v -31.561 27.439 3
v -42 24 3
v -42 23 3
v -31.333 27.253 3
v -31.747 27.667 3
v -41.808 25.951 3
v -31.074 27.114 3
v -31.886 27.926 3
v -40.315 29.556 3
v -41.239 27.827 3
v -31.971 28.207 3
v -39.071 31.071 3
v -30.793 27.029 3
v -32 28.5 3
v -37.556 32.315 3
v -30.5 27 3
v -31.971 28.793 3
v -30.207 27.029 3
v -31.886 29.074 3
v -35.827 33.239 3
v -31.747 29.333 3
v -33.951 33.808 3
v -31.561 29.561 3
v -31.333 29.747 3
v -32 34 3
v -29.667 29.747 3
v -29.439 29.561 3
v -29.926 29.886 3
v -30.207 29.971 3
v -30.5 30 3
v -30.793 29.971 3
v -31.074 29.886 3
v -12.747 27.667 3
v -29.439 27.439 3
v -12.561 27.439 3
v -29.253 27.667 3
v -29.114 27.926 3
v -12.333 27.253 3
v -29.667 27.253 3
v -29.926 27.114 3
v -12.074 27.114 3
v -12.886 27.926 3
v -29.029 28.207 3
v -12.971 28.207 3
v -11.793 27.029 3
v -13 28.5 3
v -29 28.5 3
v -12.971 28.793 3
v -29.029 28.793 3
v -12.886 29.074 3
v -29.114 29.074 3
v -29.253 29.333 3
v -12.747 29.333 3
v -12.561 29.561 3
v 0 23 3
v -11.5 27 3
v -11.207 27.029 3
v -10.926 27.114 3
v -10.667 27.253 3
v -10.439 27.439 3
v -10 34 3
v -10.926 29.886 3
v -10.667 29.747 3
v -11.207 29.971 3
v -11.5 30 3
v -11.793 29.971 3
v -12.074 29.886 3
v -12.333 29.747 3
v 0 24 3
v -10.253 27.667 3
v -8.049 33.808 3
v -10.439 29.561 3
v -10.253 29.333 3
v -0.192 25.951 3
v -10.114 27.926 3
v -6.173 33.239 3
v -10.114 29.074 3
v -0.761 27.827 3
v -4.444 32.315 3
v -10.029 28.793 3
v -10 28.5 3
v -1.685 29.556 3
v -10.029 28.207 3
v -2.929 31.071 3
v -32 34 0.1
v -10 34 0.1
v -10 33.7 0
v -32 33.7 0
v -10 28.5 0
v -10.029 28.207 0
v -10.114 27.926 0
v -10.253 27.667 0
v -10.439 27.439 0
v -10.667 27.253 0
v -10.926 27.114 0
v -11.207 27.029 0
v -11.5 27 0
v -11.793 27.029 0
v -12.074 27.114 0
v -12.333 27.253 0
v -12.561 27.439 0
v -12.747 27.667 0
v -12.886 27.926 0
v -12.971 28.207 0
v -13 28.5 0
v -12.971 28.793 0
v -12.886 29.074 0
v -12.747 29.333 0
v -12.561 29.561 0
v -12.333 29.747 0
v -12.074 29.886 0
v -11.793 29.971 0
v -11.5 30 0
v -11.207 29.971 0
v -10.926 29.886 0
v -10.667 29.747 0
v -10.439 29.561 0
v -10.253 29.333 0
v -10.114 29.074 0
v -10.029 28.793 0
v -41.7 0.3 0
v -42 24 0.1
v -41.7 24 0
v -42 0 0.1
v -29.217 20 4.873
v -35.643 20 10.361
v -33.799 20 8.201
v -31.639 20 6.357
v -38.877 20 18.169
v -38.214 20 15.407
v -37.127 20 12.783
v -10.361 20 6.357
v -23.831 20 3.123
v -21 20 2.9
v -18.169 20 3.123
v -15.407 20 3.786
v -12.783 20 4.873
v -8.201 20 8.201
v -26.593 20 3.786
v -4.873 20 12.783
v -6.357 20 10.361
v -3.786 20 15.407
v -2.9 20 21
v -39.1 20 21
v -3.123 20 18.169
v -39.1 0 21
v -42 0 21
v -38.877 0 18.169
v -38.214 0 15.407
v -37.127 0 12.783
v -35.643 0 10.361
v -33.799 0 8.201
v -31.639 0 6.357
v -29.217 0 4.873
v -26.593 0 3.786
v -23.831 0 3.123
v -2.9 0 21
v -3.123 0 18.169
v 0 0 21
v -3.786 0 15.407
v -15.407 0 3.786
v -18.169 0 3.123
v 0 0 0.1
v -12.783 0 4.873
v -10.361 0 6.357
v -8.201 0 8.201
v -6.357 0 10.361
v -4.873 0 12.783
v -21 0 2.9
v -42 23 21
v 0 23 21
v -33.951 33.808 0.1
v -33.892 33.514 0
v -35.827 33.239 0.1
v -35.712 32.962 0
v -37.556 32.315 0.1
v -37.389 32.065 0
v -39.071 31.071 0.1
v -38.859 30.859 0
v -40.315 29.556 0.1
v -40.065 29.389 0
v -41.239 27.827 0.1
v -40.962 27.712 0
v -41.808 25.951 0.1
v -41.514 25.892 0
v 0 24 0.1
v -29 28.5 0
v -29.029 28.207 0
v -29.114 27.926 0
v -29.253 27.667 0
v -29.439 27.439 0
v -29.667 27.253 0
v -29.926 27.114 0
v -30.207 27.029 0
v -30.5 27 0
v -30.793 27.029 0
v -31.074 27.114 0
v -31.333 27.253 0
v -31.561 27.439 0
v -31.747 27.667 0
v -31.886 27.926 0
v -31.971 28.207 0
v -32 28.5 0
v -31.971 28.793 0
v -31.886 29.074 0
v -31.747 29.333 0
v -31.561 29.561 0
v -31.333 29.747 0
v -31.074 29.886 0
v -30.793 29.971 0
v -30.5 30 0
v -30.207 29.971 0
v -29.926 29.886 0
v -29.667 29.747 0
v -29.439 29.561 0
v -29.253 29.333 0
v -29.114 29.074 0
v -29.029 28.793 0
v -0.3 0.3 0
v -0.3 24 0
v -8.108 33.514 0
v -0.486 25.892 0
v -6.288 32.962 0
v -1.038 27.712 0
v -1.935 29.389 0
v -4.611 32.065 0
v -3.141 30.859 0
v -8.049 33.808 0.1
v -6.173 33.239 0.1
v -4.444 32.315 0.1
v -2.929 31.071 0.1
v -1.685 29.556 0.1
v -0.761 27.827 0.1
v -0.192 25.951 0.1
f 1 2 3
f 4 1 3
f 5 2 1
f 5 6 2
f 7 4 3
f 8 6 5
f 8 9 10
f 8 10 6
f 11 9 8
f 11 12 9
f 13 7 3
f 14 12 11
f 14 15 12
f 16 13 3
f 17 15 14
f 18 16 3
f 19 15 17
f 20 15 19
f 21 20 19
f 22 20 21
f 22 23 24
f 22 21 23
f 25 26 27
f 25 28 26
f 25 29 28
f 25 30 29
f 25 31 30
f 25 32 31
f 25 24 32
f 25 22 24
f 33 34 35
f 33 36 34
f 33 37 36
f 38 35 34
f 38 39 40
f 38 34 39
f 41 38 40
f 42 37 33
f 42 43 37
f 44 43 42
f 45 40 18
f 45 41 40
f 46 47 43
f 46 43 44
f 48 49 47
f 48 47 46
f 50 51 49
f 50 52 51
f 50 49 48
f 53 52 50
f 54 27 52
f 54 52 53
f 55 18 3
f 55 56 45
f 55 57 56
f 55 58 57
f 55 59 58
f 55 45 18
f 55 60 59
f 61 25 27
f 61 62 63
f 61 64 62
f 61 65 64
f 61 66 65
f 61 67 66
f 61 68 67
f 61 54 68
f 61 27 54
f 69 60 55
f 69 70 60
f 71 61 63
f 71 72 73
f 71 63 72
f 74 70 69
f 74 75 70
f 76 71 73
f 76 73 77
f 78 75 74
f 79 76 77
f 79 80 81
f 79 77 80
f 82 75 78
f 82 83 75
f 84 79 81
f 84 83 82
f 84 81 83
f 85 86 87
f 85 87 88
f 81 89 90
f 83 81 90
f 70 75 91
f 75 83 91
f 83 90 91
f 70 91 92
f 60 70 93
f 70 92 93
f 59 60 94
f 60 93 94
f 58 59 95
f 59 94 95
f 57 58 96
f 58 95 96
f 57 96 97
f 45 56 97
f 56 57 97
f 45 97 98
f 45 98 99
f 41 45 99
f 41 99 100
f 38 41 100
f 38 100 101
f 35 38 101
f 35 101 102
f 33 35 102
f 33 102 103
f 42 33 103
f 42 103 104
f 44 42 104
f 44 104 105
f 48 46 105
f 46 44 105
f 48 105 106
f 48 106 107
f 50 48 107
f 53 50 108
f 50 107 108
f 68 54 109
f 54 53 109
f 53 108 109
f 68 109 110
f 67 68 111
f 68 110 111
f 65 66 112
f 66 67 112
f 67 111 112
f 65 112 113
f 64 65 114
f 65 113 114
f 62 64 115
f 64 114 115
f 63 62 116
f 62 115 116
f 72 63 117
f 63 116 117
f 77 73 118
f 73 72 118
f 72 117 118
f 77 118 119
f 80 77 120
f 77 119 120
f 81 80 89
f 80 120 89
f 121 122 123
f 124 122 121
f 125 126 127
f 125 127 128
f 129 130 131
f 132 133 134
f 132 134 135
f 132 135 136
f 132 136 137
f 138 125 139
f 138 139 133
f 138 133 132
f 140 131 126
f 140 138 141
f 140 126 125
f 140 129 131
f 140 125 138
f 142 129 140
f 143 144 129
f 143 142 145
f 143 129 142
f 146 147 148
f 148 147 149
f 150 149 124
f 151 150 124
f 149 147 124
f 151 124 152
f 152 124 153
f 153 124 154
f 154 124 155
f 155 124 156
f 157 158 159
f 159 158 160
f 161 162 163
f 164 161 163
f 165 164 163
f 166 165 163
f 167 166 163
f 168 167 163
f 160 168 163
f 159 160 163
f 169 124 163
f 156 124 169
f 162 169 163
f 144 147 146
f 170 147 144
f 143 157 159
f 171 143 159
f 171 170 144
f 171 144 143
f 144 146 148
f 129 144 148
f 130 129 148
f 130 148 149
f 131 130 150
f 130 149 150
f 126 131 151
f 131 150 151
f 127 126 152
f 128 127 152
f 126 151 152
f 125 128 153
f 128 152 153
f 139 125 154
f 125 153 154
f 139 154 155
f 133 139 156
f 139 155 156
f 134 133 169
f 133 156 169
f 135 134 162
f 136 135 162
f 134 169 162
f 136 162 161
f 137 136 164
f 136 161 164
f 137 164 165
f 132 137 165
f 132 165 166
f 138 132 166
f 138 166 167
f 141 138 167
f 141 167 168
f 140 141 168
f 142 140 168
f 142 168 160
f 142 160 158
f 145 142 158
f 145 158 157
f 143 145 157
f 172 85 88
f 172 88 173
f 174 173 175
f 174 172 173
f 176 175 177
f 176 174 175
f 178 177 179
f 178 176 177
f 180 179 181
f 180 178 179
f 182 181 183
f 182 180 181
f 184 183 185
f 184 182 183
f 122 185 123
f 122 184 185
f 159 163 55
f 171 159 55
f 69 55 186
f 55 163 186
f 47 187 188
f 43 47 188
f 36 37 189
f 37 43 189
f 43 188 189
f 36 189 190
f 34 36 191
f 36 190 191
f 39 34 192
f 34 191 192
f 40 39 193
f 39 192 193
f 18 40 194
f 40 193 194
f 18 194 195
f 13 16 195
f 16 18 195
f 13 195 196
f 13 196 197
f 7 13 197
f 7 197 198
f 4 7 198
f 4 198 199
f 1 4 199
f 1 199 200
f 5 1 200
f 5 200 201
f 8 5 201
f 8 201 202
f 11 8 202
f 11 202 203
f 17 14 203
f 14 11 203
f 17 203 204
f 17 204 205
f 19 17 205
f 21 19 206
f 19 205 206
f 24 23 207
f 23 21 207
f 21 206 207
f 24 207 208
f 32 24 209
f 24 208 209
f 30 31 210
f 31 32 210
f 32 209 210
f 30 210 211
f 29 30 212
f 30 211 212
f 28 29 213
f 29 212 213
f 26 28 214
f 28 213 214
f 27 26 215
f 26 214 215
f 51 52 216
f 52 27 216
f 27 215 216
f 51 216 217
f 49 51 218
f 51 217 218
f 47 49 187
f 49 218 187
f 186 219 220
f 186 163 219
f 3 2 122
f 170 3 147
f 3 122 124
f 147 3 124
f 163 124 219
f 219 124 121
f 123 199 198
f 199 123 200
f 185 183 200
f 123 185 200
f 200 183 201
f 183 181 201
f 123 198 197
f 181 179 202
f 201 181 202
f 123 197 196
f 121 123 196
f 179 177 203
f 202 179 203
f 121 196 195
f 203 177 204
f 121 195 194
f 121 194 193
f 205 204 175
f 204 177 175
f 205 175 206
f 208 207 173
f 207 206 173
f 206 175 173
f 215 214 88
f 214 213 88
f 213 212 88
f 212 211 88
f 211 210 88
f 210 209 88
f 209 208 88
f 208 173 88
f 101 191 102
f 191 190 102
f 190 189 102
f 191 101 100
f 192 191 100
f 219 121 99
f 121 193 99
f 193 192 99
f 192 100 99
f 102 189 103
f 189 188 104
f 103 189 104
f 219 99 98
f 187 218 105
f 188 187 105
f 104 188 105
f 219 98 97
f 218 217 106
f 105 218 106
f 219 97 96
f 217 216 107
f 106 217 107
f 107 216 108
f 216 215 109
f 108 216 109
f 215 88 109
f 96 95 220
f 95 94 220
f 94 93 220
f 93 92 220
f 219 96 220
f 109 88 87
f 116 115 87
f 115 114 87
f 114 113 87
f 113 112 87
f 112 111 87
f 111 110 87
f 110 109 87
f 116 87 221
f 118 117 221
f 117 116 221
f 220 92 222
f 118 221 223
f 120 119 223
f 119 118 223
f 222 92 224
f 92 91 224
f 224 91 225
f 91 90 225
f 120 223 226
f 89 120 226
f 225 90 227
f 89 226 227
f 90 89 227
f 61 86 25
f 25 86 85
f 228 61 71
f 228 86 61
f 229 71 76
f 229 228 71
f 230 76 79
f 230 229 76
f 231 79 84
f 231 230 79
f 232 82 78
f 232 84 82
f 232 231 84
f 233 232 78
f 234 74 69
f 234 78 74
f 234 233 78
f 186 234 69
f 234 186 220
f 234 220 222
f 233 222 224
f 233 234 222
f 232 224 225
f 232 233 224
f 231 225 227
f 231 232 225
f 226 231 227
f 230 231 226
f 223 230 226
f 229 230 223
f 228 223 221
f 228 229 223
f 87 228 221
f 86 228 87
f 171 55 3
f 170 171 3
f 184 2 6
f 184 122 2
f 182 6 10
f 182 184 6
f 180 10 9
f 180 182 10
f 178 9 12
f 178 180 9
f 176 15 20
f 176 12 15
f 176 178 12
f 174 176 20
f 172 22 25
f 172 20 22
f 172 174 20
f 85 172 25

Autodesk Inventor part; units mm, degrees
ref_plane "YZ Plane" through (0, 0, 0) normal (1, 0, 0) x (0, 1, 0)
ref_plane "XZ Plane" through (0, 0, 0) normal (0, 1, 0) x (-1, 0, 0)
ref_plane "XY Plane" through (0, 0, 0) normal (0, 0, 1) x (1, 0, 0)
sketch "Эскиз1" plane through (0, 0, 0) normal (0, 0, 1) x (1, 0, 0)
  line L0 (-42, 24) -> (-42, 23)
  line L1 (-10, 34) -> (-32, 34)
  line L2 (-42, 23) -> (-42, 0)
  line L3 (0, 23) -> (-42, 23)
  line L4 (-42, 0) -> (0, 0)
  line L5 (-42, 23) -> (0, 23)
  line L6 (-27.8, 26.9412) -> (-30.5, 25.3823)
  line L7 (-30.5, 25.3823) -> (-33.2, 26.9412)
  circle A0 centre (-30.5, 28.5) radius 1.5
  line L8 (-27.8, 30.0588) -> (-27.8, 26.9412)
  line L9 (-33.2, 26.9412) -> (-33.2, 30.0588)
  arc A1 (-32, 34) -> (-42, 24) centre (-32, 24) ccw
  line L10 (-30.5, 31.6177) -> (-27.8, 30.0588)
  line L11 (-33.2, 30.0588) -> (-30.5, 31.6177)
  line L12 (-14.2, 26.9412) -> (-14.2, 30.0588)
  line L13 (-14.2, 30.0588) -> (-11.5, 31.6177)
  line L14 (-11.5, 25.3823) -> (-14.2, 26.9412)
  circle A2 centre (-11.5, 28.5) radius 1.5
  line L15 (-11.5, 31.6177) -> (-8.8, 30.0588)
  line L16 (-8.8, 30.0588) -> (-8.8, 26.9412)
  line L17 (-8.8, 26.9412) -> (-11.5, 25.3823)
  line L18 (0, 0) -> (0, 23)
  line L19 (0, 23) -> (0, 24)
  arc A3 (0, 24) -> (-10, 34) centre (-10, 24) ccw
  dimension "d0" = 23
  dimension "d1" = 5.4
  dimension "d2" = 10
  dimension "d4" = 4
  dimension "d5" = 4
  dimension "d7" = 4
  dimension "d8" = 10
  dimension "d9" = 10
  dimension "d10" = 42
extrude "Выдавливание1" add sketch "Эскиз1" along normal blind 21 contours L3 L18 L4 L2
sketch "Эскиз2" plane through (-42, 0, 0) normal (0, -1, 0) x (1, 0, 0)
  line L0 (0, 21) -> (42, 21) projected
  circle A0 centre (21, 21) radius 18.1
  point P0 (42, 0)
  point P1 (39.1, 21)
  point P2 (2.9, 21)
extrude "Выдавливание2" cut sketch "Эскиз2" against normal blind 20 contours L0 A0 picked at (19.3763, 11.111)
extrude "Выдавливание3" add sketch "Эскиз1" along normal blind 3 contours A1 L1 A3 L19 L3 L0 | L6 L7 L9 L11 L10 L8 | L12 L13 L15 L16 L17 L14
chamfer "Фаска1" distance 0.3 distance2 0.1 5 edges at (0, 12, 0) (-2.9289, 31.0711, 0) (-21, 34, 0) (-39.0711, 31.0711, 0) (-21, 0, 0) measured on face at (-18.0106, 9.0325, 0)
properties part number "Держатель динамика"
